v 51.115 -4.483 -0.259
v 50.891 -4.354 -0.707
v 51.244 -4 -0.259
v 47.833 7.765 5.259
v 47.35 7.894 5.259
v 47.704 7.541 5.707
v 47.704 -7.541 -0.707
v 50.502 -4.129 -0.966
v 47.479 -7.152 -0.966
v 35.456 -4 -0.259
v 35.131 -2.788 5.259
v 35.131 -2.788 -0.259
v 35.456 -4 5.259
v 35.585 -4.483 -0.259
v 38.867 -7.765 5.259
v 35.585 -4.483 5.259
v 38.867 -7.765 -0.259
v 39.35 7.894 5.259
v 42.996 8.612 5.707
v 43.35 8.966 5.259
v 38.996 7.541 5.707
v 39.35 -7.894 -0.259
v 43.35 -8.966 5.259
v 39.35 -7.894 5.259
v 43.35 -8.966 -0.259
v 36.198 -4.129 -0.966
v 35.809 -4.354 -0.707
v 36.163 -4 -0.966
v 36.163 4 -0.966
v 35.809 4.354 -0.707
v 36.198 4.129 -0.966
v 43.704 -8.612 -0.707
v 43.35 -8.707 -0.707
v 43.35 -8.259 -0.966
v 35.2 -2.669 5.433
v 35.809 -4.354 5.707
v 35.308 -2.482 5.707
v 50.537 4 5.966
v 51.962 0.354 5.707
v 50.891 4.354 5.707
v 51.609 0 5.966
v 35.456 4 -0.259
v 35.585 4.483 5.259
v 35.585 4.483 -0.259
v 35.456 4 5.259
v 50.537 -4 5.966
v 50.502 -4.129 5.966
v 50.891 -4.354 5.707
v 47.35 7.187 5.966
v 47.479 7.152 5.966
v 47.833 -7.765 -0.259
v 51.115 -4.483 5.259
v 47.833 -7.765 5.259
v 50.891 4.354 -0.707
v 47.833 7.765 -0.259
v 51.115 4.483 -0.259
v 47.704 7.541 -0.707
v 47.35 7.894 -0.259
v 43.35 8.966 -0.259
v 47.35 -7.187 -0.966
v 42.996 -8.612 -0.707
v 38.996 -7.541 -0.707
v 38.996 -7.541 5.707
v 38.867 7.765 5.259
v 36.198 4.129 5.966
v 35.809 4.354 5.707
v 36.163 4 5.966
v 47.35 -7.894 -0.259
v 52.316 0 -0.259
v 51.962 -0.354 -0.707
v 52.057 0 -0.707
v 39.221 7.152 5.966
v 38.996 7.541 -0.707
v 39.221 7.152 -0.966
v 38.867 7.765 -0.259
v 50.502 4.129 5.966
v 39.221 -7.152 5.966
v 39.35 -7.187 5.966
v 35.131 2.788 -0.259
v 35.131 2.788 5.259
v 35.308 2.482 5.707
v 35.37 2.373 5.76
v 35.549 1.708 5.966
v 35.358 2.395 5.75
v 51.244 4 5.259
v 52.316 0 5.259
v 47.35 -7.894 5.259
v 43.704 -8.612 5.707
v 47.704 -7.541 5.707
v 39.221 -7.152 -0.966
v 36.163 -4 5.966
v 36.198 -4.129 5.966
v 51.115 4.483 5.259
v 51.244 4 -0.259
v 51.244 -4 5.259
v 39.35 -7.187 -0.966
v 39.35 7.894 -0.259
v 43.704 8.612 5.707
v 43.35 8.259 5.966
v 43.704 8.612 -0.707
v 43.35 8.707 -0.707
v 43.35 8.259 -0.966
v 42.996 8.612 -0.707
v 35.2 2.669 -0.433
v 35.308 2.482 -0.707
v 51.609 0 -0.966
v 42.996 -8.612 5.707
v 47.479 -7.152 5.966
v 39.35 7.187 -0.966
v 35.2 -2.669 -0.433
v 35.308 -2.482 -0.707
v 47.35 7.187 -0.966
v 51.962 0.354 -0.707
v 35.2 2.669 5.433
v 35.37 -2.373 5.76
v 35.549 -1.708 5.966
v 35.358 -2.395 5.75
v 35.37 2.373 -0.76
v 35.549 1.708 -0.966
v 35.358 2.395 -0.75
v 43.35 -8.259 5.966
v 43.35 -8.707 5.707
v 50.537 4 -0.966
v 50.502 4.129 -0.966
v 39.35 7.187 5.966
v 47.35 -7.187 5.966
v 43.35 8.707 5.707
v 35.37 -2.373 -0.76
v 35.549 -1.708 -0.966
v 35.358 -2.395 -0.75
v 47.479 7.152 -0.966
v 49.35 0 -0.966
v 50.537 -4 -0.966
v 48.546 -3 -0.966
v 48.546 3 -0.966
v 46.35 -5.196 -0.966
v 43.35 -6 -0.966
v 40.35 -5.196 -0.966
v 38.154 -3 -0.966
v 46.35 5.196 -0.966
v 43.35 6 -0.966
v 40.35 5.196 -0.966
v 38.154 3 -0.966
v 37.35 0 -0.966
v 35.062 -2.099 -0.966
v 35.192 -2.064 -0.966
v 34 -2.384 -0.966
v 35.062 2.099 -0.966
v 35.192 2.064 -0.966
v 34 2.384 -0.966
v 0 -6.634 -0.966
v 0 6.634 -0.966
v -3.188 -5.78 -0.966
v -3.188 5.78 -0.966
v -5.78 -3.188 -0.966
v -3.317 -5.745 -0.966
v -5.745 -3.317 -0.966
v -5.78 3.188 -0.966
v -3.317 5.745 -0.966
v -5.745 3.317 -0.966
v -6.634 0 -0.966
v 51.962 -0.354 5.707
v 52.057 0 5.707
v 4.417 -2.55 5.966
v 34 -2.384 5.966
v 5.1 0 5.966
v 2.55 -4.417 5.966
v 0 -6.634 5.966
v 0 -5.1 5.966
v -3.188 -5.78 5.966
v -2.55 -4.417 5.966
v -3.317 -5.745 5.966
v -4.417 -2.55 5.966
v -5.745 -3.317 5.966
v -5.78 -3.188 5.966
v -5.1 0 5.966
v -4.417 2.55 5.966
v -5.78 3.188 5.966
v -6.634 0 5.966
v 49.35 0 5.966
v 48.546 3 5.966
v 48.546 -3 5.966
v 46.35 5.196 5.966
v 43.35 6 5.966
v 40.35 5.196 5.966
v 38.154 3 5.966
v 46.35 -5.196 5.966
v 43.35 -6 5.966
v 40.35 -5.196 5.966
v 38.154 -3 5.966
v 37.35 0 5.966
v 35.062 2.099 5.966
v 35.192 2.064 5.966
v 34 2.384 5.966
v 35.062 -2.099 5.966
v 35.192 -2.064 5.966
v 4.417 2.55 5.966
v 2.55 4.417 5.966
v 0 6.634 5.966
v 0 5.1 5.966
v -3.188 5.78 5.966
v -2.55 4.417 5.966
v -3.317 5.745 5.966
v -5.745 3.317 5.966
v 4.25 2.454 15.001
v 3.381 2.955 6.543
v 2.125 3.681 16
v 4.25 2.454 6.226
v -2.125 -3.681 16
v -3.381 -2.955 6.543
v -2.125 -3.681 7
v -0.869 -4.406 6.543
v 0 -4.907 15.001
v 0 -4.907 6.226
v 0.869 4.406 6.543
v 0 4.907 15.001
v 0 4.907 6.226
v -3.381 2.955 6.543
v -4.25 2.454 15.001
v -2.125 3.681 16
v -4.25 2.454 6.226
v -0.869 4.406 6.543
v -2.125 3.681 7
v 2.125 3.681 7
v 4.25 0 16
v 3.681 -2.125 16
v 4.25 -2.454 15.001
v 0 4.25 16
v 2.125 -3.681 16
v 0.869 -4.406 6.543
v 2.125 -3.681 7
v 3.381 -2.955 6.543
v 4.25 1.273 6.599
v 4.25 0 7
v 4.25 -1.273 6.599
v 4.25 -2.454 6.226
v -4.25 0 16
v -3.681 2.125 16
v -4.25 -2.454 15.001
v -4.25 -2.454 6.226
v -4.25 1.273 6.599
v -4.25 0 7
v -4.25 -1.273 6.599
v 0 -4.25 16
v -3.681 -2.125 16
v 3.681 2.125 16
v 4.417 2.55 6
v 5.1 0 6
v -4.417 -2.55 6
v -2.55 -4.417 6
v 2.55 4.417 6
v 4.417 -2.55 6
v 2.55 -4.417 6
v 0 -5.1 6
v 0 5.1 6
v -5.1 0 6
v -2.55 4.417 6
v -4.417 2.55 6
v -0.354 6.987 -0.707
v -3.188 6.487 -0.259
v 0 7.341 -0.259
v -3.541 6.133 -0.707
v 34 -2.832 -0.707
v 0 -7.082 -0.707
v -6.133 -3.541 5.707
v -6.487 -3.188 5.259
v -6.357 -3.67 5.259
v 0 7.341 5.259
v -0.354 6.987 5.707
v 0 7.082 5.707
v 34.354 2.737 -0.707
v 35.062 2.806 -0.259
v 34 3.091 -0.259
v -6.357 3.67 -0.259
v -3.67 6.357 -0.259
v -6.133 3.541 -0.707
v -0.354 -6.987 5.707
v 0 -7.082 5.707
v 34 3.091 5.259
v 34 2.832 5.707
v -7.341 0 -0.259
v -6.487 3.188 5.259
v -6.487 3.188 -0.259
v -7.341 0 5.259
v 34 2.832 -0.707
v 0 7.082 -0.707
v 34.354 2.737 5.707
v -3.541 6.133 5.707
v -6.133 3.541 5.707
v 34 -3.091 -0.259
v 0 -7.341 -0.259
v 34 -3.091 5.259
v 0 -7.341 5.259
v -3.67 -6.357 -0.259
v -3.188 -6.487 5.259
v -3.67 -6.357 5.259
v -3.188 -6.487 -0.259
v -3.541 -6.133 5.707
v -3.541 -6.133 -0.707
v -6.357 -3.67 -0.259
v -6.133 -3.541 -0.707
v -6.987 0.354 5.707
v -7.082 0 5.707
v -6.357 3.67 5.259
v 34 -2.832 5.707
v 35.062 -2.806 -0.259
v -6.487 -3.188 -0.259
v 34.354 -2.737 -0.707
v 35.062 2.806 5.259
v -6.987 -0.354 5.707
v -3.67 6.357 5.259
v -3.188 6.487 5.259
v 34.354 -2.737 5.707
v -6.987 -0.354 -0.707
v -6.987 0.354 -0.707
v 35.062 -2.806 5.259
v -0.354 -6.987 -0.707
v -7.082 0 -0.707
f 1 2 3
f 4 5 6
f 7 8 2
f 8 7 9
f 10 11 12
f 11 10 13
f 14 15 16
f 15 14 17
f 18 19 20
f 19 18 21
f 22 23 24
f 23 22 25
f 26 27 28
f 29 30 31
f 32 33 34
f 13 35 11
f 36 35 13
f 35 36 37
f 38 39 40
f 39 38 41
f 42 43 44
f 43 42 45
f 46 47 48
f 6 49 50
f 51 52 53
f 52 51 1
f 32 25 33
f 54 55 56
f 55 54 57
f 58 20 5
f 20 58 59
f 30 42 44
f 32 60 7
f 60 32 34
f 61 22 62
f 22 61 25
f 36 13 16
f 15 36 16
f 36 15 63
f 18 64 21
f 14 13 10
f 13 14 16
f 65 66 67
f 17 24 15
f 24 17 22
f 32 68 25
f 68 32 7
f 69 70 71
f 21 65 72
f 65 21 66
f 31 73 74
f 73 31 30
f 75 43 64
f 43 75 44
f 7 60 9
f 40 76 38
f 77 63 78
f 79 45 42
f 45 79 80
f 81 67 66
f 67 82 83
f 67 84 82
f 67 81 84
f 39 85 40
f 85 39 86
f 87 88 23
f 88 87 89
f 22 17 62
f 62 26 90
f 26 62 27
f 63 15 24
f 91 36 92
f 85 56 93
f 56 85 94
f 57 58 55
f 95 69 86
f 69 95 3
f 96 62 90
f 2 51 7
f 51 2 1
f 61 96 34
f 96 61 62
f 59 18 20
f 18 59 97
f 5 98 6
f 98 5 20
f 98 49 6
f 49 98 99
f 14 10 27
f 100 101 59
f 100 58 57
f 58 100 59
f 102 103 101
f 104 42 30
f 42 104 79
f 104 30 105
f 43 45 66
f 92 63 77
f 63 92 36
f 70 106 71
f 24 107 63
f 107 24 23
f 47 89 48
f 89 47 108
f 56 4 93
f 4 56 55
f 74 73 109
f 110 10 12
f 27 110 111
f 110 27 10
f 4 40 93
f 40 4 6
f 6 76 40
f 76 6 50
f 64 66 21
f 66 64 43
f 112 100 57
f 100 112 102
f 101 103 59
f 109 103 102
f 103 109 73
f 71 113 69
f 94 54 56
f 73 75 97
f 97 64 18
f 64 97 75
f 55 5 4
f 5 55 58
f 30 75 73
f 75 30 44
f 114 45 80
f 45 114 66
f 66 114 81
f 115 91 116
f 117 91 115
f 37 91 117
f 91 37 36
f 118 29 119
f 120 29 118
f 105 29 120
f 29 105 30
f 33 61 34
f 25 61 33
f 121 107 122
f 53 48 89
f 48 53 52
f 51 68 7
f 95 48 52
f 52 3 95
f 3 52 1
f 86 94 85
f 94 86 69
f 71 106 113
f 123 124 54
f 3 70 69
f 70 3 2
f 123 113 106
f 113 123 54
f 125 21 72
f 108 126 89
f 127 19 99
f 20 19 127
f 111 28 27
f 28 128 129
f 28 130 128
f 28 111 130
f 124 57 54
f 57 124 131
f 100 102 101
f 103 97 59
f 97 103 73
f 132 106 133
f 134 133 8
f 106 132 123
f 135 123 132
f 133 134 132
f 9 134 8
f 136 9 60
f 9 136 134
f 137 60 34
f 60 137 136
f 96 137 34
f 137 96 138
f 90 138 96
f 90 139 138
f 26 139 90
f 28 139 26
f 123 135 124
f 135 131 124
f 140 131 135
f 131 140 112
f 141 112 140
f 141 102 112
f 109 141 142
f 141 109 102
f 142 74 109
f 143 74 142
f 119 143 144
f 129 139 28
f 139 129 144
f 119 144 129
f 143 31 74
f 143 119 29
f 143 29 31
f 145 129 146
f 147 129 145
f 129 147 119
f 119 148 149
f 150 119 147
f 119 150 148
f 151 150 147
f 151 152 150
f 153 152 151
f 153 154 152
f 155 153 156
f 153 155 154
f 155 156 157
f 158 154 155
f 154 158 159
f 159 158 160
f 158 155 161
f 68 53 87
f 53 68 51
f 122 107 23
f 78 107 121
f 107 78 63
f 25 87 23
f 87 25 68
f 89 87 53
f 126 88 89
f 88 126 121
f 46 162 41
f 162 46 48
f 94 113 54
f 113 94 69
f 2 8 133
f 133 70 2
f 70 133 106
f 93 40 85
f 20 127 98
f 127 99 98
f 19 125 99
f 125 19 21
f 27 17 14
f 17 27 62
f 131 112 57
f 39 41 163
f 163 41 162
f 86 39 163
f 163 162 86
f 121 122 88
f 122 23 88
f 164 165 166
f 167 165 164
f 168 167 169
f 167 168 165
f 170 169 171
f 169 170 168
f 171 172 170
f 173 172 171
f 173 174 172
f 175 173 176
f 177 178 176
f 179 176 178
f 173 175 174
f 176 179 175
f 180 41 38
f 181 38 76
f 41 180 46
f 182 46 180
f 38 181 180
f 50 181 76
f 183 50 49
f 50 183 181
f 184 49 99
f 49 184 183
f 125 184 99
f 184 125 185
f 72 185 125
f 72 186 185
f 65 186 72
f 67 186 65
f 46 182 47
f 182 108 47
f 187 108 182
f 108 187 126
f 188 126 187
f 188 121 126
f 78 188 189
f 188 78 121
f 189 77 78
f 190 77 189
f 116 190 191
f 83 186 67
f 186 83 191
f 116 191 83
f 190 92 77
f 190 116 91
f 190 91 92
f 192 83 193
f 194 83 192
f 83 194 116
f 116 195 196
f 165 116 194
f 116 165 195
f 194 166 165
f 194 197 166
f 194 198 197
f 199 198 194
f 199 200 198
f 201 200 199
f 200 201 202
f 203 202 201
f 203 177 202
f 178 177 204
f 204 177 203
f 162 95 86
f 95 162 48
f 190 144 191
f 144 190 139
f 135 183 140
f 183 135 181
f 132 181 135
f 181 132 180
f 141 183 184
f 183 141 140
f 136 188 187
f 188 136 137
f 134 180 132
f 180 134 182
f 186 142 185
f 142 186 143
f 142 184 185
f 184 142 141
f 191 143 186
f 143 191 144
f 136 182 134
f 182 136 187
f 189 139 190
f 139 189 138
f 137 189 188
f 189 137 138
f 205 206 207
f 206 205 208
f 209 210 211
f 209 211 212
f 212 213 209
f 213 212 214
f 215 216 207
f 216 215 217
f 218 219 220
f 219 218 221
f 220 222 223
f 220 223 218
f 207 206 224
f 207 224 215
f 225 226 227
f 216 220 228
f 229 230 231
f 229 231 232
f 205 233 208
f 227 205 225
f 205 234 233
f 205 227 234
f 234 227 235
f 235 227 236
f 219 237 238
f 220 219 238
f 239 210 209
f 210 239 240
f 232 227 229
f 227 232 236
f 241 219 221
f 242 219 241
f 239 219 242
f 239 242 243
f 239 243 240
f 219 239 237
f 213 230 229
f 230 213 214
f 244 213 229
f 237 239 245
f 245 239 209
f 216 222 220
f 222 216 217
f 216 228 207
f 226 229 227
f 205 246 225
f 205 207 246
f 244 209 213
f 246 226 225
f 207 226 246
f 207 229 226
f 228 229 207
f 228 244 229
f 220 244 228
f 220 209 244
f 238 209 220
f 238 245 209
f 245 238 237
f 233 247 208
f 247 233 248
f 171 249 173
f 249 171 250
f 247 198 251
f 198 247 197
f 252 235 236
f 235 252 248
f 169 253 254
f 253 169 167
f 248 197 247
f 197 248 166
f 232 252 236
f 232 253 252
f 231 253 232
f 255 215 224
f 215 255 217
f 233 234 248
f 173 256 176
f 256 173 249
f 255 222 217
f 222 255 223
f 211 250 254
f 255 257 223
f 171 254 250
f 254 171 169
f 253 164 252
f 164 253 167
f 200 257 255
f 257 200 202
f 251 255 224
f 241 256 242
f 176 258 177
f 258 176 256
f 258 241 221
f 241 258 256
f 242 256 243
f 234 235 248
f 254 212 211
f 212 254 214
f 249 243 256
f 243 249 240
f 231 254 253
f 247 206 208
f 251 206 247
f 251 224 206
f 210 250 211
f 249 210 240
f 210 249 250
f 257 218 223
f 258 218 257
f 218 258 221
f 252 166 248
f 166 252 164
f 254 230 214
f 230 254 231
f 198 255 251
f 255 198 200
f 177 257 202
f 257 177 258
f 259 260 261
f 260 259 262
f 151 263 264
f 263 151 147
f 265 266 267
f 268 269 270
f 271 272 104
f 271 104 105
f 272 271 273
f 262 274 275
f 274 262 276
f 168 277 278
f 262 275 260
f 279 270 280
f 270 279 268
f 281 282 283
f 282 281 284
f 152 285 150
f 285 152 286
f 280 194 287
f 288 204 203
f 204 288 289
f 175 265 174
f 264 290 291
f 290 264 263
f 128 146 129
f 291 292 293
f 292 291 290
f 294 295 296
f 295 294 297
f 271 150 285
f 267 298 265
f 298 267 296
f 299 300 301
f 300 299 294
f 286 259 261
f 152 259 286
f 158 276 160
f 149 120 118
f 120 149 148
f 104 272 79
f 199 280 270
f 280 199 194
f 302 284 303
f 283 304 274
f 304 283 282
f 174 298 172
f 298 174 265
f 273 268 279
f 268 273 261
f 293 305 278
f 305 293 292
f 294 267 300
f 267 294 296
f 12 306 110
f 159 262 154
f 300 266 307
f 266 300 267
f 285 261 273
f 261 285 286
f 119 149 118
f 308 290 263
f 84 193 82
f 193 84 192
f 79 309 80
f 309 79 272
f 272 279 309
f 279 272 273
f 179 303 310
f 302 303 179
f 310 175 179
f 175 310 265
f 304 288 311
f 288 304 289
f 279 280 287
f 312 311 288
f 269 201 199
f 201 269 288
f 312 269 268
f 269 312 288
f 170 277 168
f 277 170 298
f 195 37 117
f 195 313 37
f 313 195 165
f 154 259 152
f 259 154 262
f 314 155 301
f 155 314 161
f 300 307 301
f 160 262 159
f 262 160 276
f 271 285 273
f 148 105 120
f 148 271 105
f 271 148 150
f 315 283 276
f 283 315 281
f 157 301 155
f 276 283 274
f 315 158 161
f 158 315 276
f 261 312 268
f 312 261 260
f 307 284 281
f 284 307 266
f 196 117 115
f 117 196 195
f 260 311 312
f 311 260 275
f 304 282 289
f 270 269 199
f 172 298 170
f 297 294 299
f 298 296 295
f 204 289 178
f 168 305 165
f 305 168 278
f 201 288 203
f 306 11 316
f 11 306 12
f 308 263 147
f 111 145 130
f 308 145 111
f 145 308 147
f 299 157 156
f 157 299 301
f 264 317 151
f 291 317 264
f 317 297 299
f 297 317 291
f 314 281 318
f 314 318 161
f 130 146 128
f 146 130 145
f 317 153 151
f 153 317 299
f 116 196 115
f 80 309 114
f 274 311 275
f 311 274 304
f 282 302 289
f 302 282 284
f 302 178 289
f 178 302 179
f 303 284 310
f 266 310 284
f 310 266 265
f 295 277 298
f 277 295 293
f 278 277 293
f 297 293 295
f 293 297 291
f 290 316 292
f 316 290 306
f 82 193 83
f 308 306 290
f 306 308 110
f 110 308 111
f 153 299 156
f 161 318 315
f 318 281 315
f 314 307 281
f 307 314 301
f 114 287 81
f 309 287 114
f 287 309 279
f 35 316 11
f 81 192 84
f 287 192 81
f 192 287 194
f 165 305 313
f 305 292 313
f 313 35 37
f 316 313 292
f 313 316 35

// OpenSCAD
hex_size = 8.5;
face_length = hex_size / sqrt(3);
post_height = 10;
handle_height = 5;
roundcorner = 2;

fn_upper = 200;
fn_lower = 12;

rc = false;
$fn = rc ? fn_upper : fn_lower;




hull() {
    translate([0, 0, ((post_height+handle_height) / 2) + 0.001]) {
        hull() {
            cube([hex_size, face_length, post_height + handle_height], center=true);
    
            rotate([0, 0, 120]) {
                cube([hex_size, face_length, post_height+handle_height], center=true);
            }
            rotate([0, 0, 240]) {
                cube([hex_size, face_length, post_height+handle_height], center=true);
            }
        }
    }
    translate([0, 0, post_height + handle_height]) {
        cylinder(h = post_height / 10, d = hex_size);
    }
        

}
hull() {
    translate([0, 0, handle_height + (post_height / 10)]) {
        color("blue") cylinder(h = post_height / 10, d = hex_size);
    }
    translate([0, 0, handle_height]) {
        color("red") cylinder(h = post_height / 10, d = hex_size * 1.2 );
    }
}




minkowski() {
        union() {
            hull() {
                cylinder(h = handle_height, d = hex_size * 1.5);
                translate([hex_size * 4, 0, 0]) {
                    cylinder(h = handle_height, d = hex_size * 1/2);
                }
            }
        }
    sphere(r=roundcorner / 2);

}
  
translate([hex_size * 5.1, 0, 0]) {
    difference() {
        minkowski() {
            cylinder(h = handle_height, d = 16);
            sphere(r=roundcorner / 2);
        }
        translate([0, 0, -roundcorner]) {
            cylinder(h = handle_height + (roundcorner * 2), d=12);
        }
    }
}
